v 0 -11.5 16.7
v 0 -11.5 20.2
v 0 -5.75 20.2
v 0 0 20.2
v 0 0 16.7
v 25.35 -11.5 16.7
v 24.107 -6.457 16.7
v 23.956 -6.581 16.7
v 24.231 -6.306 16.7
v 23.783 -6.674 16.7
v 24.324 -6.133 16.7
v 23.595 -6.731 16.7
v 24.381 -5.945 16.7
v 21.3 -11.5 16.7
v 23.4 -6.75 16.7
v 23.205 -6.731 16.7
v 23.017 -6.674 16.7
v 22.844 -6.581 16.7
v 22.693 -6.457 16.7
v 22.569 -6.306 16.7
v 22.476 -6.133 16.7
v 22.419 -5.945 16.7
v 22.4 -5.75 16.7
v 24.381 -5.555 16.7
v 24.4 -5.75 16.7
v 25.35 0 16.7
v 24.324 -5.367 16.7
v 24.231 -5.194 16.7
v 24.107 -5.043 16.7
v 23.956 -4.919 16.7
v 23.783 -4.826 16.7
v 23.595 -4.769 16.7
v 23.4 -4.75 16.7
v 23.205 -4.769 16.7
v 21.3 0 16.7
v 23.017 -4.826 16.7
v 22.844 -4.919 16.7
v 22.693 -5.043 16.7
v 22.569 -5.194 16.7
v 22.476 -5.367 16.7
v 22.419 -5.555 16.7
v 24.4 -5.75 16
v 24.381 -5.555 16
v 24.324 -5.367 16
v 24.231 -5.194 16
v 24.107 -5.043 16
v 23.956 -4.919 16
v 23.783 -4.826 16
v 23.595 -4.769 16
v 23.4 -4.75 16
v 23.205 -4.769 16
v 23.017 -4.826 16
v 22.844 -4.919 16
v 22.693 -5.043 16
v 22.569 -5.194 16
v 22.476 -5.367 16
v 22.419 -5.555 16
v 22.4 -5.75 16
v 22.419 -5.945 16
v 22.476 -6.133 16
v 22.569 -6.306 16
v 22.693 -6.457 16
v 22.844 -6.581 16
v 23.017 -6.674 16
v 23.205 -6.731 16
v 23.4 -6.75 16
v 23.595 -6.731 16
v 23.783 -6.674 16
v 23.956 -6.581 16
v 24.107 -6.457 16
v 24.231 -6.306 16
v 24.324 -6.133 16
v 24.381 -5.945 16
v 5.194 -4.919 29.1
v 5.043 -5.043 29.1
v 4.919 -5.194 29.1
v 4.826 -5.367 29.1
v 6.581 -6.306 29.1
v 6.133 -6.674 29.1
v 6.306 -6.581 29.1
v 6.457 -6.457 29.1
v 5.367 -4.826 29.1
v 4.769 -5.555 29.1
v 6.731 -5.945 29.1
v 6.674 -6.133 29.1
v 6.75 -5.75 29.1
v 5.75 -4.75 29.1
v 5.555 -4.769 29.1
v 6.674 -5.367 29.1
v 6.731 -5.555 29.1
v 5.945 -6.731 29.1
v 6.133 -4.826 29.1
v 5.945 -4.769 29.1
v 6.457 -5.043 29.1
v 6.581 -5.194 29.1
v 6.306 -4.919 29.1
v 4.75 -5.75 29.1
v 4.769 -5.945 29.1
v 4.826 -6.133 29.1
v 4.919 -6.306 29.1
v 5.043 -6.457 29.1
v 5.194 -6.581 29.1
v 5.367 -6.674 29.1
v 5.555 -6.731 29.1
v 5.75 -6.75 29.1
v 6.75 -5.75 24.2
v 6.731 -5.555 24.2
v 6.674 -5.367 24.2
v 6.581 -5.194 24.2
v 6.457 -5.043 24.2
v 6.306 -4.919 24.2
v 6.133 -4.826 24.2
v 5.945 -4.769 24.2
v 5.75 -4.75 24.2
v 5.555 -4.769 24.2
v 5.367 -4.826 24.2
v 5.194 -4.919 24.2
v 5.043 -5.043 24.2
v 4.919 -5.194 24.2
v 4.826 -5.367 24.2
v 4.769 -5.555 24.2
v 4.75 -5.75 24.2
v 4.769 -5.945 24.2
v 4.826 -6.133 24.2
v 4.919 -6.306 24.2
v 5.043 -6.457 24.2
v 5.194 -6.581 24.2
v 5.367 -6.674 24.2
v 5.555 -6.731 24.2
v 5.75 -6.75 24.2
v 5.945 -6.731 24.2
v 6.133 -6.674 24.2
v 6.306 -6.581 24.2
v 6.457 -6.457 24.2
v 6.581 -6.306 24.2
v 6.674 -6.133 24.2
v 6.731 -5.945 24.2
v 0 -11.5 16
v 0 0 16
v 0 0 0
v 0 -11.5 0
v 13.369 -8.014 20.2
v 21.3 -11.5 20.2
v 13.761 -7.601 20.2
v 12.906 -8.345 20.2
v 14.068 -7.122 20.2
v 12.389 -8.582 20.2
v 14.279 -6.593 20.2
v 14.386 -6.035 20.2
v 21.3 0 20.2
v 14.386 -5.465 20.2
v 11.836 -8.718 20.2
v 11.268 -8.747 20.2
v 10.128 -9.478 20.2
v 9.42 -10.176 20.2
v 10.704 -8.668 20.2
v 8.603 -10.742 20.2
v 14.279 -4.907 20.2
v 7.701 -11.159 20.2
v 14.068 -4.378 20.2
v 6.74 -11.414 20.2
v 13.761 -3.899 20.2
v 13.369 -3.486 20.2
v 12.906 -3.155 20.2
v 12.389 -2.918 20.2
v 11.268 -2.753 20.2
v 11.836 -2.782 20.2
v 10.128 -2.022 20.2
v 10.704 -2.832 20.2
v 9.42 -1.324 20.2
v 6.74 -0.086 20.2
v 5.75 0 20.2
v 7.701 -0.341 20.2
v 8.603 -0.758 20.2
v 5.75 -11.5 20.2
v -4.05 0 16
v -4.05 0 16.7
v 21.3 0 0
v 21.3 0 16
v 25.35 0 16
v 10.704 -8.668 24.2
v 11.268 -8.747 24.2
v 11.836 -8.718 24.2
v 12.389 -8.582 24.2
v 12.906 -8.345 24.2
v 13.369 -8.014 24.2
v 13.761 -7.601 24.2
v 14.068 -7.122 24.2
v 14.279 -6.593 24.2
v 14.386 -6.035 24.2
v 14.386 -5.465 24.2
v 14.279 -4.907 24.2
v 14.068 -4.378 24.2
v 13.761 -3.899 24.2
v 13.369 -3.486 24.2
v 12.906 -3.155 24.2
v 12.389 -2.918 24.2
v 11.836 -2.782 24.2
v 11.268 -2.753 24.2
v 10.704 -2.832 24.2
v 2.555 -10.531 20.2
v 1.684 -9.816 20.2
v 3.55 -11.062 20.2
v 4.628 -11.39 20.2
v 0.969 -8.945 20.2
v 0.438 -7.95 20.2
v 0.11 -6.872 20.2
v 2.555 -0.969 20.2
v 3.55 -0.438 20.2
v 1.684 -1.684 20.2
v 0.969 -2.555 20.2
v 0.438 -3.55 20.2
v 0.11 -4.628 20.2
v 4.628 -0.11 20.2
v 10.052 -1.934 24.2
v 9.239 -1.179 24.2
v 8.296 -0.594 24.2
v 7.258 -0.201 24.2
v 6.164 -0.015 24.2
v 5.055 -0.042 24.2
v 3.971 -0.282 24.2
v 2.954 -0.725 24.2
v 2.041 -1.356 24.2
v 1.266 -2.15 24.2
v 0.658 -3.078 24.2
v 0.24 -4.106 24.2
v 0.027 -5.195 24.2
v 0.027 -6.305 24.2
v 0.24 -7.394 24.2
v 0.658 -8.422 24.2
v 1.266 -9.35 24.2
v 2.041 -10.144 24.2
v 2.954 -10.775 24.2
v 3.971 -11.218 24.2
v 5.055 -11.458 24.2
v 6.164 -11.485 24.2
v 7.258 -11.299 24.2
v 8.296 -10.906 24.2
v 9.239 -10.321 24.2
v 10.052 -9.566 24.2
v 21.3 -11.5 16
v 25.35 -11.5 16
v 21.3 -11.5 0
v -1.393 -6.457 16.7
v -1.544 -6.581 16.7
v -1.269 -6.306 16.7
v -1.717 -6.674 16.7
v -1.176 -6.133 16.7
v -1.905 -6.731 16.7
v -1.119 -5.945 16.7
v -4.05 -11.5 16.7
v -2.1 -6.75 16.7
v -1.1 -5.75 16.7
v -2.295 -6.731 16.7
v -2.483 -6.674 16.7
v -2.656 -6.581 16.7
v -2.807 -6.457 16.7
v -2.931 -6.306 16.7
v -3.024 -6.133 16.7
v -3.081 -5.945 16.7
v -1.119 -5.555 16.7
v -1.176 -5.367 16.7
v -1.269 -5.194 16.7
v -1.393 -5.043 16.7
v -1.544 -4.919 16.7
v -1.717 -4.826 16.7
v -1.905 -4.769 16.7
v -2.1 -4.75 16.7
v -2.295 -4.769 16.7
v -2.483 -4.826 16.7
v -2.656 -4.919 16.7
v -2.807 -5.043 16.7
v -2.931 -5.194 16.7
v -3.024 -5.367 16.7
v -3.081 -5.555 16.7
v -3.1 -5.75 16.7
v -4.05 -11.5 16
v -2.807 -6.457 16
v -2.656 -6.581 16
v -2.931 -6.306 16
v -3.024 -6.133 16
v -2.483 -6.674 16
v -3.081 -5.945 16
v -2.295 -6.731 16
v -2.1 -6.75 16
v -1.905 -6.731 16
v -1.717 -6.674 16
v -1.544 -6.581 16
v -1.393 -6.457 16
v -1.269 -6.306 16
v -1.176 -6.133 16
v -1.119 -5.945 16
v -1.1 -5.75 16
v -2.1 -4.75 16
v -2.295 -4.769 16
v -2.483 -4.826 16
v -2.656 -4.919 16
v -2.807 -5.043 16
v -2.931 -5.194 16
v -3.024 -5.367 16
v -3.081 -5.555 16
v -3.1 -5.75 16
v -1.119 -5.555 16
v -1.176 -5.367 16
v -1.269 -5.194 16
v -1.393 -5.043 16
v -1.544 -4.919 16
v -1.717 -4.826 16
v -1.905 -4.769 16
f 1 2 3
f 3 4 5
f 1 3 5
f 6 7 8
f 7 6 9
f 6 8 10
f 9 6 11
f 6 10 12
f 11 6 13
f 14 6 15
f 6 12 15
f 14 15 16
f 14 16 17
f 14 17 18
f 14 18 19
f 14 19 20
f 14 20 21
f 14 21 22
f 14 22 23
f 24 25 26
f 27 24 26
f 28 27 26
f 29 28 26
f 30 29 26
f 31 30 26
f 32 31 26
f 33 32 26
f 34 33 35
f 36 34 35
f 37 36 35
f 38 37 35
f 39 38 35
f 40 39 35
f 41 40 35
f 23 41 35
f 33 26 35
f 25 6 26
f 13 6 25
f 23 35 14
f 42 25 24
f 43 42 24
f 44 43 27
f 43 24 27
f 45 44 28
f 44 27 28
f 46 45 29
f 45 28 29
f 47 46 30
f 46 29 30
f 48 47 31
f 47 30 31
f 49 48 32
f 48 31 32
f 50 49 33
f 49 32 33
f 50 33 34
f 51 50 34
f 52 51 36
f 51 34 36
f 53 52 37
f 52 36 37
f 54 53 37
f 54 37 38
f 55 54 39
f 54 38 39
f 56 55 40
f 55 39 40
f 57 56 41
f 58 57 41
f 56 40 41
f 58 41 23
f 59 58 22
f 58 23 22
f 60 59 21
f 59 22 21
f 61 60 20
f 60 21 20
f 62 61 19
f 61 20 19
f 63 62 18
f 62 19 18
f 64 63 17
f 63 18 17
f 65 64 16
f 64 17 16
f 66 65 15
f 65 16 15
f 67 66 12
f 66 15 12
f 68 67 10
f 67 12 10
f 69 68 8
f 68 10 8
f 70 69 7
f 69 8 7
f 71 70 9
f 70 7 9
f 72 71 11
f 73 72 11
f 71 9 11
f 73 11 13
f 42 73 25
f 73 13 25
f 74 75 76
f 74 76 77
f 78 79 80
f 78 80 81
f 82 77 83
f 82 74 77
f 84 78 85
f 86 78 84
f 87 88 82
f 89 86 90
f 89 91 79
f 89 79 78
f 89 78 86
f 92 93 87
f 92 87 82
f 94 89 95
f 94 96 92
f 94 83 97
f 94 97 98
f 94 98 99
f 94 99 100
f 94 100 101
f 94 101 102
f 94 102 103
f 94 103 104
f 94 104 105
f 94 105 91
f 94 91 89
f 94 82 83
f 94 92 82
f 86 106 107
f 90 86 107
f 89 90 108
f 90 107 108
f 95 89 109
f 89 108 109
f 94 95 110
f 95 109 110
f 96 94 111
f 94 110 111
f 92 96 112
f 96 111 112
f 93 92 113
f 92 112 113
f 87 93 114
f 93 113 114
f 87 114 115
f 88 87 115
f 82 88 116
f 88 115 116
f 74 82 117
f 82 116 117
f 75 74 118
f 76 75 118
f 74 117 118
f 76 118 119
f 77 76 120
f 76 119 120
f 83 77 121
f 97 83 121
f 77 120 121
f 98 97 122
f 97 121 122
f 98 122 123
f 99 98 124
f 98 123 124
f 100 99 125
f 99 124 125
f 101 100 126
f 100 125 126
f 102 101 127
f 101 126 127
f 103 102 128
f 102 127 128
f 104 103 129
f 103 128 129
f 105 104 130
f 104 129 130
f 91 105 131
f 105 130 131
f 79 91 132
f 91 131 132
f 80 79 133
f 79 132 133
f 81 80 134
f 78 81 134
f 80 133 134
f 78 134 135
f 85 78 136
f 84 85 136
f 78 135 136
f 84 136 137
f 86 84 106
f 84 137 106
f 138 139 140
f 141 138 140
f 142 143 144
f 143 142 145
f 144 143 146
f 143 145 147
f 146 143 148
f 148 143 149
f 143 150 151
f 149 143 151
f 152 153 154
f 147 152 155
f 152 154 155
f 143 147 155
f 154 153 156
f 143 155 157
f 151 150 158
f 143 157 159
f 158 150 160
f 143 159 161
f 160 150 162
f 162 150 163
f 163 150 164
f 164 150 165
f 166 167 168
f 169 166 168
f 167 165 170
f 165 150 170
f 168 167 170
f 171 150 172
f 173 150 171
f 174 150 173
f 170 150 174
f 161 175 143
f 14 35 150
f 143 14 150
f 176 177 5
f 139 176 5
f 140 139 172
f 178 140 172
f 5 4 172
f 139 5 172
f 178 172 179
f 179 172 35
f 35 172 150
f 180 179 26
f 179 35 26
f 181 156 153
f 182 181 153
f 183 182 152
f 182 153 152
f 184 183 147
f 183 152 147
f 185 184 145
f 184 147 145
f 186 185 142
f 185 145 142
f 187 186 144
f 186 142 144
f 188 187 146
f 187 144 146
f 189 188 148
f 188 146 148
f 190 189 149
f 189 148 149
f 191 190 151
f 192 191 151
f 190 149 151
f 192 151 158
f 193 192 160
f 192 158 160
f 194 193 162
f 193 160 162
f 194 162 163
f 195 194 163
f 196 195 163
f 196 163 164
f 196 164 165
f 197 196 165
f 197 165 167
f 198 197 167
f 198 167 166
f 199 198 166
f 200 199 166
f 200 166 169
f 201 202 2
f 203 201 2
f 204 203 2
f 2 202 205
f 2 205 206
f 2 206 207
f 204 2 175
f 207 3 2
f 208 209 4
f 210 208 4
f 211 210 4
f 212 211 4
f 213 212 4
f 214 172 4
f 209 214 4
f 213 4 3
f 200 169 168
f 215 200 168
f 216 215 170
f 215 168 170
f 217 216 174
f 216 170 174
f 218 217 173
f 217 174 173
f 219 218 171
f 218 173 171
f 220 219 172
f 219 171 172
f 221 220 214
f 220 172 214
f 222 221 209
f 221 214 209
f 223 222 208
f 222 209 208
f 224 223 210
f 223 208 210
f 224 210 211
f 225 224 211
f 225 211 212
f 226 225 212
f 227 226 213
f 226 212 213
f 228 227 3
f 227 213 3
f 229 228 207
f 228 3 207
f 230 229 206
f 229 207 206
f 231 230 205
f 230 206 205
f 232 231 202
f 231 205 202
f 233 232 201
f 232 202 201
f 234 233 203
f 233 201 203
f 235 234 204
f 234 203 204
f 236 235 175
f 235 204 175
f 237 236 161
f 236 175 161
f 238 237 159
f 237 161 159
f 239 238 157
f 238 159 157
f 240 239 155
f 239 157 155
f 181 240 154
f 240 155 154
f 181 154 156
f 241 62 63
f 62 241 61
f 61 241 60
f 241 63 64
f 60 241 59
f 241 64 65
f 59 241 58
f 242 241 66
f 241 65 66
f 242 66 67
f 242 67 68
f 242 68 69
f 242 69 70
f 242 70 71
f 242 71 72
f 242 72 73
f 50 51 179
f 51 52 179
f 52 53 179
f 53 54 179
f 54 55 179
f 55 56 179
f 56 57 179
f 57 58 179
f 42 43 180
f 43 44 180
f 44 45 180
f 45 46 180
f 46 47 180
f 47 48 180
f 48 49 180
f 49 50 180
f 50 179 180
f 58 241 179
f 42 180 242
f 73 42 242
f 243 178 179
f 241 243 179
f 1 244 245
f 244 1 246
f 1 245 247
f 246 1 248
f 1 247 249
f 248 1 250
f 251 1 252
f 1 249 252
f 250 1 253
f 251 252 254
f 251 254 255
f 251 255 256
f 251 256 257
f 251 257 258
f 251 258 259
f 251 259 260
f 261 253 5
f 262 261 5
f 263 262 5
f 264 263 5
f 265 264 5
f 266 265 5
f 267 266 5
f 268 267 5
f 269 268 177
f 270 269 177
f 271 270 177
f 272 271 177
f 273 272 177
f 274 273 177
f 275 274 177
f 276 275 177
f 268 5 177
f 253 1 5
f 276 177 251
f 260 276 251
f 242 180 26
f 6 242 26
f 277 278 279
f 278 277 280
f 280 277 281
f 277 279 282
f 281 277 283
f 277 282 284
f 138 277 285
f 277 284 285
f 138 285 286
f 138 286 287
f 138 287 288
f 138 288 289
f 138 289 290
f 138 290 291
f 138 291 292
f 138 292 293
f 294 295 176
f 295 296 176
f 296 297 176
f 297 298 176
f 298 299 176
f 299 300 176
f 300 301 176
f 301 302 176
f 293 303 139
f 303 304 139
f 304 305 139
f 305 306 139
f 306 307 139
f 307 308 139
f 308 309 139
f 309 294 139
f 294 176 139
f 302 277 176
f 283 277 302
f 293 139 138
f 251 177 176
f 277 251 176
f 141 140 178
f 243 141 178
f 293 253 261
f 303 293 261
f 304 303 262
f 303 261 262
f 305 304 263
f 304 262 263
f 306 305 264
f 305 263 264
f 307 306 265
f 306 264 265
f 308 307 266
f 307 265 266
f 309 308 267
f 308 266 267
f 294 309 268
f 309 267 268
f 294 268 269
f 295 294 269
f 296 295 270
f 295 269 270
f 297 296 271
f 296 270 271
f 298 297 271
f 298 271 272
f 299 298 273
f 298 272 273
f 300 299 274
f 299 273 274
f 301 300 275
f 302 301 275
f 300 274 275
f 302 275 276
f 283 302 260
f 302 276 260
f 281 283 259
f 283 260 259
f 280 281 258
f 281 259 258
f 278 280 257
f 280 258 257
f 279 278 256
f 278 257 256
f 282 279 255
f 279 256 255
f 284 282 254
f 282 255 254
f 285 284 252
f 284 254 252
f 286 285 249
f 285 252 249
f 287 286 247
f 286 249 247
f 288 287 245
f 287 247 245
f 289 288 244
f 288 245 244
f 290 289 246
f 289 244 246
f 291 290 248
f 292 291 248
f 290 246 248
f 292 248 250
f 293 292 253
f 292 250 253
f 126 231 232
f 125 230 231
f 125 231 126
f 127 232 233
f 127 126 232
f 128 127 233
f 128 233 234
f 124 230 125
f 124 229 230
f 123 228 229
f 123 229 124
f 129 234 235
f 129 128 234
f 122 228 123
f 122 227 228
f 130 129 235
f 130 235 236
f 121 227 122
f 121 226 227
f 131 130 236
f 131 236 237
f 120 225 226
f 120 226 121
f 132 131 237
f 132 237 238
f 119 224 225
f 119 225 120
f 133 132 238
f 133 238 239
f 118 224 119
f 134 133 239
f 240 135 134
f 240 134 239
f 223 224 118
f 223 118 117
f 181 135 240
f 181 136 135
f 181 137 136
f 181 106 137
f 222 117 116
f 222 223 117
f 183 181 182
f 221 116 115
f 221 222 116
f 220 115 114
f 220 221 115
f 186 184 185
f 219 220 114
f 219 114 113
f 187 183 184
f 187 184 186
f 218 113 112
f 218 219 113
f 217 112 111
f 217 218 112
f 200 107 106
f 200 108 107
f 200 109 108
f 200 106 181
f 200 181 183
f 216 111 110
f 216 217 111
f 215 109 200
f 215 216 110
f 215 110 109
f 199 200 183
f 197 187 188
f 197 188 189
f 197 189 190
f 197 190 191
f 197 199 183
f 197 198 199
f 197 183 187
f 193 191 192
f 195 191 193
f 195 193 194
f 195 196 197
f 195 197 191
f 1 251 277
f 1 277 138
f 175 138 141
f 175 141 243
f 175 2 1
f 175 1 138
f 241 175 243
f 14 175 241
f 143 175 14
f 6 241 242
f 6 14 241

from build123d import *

# Parameters (mm, degrees)
F1_DEPTH = 11.5
F3_DEPTH = 4
F4_R     = 1
F5_DEPTH = 0.7
F6_R     = 1
F7_DEPTH = 0.7
F8_R     = 1
F9_DEPTH = 4.9


# Not quite as in the source:
# - a feature of the source that left no trace in its solid (it failed there, or was rolled back) is left out


with BuildPart() as f1:
    # F0 (on Front) → F1 (new body)
    with BuildSketch(Plane.XZ):
        Polygon((0, 16), (0, 0), (21.3, 0), (21.3, 16), (25.35, 16), (25.35, 16.7), (21.3, 16.7), (21.3, 20.2), (0, 20.2), (0, 16.7), (-4.05, 16.7), (-4.05, 16), align=None)
    extrude(amount=F1_DEPTH)

    # F2 (on face) → F3 (join)
    with BuildSketch(Plane.XY.offset(20.2)):
        with BuildLine():
            ThreePointArc((10.7044247788, -8.6682486377), (14.4, -5.75), (10.7044247788, -2.8317513623))
            ThreePointArc((10.7044247788, -2.8317513623), (0, -5.75), (10.7044247788, -8.6682486377))
        make_face()
    extrude(amount=F3_DEPTH)

    # F4 (on face) → F5 (cut, through all)
    with BuildSketch(Plane.XY.offset(16.7)):
        with Locations((-2.1, -5.75)):
            Circle(F4_R)
    extrude(amount=-F5_DEPTH, mode=Mode.SUBTRACT)

    # F6 (on face) → F7 (cut, through all)
    with BuildSketch(Plane.XY.offset(16.7)):
        with Locations((23.4, -5.75)):
            Circle(F6_R)
    extrude(amount=-F7_DEPTH, mode=Mode.SUBTRACT)

    # F8 (on face) → F9 (join)
    with BuildSketch(Plane.XY.offset(24.2)):
        with Locations((5.75, -5.75)):
            Circle(F8_R)
    extrude(amount=F9_DEPTH)


solid = f1.part
